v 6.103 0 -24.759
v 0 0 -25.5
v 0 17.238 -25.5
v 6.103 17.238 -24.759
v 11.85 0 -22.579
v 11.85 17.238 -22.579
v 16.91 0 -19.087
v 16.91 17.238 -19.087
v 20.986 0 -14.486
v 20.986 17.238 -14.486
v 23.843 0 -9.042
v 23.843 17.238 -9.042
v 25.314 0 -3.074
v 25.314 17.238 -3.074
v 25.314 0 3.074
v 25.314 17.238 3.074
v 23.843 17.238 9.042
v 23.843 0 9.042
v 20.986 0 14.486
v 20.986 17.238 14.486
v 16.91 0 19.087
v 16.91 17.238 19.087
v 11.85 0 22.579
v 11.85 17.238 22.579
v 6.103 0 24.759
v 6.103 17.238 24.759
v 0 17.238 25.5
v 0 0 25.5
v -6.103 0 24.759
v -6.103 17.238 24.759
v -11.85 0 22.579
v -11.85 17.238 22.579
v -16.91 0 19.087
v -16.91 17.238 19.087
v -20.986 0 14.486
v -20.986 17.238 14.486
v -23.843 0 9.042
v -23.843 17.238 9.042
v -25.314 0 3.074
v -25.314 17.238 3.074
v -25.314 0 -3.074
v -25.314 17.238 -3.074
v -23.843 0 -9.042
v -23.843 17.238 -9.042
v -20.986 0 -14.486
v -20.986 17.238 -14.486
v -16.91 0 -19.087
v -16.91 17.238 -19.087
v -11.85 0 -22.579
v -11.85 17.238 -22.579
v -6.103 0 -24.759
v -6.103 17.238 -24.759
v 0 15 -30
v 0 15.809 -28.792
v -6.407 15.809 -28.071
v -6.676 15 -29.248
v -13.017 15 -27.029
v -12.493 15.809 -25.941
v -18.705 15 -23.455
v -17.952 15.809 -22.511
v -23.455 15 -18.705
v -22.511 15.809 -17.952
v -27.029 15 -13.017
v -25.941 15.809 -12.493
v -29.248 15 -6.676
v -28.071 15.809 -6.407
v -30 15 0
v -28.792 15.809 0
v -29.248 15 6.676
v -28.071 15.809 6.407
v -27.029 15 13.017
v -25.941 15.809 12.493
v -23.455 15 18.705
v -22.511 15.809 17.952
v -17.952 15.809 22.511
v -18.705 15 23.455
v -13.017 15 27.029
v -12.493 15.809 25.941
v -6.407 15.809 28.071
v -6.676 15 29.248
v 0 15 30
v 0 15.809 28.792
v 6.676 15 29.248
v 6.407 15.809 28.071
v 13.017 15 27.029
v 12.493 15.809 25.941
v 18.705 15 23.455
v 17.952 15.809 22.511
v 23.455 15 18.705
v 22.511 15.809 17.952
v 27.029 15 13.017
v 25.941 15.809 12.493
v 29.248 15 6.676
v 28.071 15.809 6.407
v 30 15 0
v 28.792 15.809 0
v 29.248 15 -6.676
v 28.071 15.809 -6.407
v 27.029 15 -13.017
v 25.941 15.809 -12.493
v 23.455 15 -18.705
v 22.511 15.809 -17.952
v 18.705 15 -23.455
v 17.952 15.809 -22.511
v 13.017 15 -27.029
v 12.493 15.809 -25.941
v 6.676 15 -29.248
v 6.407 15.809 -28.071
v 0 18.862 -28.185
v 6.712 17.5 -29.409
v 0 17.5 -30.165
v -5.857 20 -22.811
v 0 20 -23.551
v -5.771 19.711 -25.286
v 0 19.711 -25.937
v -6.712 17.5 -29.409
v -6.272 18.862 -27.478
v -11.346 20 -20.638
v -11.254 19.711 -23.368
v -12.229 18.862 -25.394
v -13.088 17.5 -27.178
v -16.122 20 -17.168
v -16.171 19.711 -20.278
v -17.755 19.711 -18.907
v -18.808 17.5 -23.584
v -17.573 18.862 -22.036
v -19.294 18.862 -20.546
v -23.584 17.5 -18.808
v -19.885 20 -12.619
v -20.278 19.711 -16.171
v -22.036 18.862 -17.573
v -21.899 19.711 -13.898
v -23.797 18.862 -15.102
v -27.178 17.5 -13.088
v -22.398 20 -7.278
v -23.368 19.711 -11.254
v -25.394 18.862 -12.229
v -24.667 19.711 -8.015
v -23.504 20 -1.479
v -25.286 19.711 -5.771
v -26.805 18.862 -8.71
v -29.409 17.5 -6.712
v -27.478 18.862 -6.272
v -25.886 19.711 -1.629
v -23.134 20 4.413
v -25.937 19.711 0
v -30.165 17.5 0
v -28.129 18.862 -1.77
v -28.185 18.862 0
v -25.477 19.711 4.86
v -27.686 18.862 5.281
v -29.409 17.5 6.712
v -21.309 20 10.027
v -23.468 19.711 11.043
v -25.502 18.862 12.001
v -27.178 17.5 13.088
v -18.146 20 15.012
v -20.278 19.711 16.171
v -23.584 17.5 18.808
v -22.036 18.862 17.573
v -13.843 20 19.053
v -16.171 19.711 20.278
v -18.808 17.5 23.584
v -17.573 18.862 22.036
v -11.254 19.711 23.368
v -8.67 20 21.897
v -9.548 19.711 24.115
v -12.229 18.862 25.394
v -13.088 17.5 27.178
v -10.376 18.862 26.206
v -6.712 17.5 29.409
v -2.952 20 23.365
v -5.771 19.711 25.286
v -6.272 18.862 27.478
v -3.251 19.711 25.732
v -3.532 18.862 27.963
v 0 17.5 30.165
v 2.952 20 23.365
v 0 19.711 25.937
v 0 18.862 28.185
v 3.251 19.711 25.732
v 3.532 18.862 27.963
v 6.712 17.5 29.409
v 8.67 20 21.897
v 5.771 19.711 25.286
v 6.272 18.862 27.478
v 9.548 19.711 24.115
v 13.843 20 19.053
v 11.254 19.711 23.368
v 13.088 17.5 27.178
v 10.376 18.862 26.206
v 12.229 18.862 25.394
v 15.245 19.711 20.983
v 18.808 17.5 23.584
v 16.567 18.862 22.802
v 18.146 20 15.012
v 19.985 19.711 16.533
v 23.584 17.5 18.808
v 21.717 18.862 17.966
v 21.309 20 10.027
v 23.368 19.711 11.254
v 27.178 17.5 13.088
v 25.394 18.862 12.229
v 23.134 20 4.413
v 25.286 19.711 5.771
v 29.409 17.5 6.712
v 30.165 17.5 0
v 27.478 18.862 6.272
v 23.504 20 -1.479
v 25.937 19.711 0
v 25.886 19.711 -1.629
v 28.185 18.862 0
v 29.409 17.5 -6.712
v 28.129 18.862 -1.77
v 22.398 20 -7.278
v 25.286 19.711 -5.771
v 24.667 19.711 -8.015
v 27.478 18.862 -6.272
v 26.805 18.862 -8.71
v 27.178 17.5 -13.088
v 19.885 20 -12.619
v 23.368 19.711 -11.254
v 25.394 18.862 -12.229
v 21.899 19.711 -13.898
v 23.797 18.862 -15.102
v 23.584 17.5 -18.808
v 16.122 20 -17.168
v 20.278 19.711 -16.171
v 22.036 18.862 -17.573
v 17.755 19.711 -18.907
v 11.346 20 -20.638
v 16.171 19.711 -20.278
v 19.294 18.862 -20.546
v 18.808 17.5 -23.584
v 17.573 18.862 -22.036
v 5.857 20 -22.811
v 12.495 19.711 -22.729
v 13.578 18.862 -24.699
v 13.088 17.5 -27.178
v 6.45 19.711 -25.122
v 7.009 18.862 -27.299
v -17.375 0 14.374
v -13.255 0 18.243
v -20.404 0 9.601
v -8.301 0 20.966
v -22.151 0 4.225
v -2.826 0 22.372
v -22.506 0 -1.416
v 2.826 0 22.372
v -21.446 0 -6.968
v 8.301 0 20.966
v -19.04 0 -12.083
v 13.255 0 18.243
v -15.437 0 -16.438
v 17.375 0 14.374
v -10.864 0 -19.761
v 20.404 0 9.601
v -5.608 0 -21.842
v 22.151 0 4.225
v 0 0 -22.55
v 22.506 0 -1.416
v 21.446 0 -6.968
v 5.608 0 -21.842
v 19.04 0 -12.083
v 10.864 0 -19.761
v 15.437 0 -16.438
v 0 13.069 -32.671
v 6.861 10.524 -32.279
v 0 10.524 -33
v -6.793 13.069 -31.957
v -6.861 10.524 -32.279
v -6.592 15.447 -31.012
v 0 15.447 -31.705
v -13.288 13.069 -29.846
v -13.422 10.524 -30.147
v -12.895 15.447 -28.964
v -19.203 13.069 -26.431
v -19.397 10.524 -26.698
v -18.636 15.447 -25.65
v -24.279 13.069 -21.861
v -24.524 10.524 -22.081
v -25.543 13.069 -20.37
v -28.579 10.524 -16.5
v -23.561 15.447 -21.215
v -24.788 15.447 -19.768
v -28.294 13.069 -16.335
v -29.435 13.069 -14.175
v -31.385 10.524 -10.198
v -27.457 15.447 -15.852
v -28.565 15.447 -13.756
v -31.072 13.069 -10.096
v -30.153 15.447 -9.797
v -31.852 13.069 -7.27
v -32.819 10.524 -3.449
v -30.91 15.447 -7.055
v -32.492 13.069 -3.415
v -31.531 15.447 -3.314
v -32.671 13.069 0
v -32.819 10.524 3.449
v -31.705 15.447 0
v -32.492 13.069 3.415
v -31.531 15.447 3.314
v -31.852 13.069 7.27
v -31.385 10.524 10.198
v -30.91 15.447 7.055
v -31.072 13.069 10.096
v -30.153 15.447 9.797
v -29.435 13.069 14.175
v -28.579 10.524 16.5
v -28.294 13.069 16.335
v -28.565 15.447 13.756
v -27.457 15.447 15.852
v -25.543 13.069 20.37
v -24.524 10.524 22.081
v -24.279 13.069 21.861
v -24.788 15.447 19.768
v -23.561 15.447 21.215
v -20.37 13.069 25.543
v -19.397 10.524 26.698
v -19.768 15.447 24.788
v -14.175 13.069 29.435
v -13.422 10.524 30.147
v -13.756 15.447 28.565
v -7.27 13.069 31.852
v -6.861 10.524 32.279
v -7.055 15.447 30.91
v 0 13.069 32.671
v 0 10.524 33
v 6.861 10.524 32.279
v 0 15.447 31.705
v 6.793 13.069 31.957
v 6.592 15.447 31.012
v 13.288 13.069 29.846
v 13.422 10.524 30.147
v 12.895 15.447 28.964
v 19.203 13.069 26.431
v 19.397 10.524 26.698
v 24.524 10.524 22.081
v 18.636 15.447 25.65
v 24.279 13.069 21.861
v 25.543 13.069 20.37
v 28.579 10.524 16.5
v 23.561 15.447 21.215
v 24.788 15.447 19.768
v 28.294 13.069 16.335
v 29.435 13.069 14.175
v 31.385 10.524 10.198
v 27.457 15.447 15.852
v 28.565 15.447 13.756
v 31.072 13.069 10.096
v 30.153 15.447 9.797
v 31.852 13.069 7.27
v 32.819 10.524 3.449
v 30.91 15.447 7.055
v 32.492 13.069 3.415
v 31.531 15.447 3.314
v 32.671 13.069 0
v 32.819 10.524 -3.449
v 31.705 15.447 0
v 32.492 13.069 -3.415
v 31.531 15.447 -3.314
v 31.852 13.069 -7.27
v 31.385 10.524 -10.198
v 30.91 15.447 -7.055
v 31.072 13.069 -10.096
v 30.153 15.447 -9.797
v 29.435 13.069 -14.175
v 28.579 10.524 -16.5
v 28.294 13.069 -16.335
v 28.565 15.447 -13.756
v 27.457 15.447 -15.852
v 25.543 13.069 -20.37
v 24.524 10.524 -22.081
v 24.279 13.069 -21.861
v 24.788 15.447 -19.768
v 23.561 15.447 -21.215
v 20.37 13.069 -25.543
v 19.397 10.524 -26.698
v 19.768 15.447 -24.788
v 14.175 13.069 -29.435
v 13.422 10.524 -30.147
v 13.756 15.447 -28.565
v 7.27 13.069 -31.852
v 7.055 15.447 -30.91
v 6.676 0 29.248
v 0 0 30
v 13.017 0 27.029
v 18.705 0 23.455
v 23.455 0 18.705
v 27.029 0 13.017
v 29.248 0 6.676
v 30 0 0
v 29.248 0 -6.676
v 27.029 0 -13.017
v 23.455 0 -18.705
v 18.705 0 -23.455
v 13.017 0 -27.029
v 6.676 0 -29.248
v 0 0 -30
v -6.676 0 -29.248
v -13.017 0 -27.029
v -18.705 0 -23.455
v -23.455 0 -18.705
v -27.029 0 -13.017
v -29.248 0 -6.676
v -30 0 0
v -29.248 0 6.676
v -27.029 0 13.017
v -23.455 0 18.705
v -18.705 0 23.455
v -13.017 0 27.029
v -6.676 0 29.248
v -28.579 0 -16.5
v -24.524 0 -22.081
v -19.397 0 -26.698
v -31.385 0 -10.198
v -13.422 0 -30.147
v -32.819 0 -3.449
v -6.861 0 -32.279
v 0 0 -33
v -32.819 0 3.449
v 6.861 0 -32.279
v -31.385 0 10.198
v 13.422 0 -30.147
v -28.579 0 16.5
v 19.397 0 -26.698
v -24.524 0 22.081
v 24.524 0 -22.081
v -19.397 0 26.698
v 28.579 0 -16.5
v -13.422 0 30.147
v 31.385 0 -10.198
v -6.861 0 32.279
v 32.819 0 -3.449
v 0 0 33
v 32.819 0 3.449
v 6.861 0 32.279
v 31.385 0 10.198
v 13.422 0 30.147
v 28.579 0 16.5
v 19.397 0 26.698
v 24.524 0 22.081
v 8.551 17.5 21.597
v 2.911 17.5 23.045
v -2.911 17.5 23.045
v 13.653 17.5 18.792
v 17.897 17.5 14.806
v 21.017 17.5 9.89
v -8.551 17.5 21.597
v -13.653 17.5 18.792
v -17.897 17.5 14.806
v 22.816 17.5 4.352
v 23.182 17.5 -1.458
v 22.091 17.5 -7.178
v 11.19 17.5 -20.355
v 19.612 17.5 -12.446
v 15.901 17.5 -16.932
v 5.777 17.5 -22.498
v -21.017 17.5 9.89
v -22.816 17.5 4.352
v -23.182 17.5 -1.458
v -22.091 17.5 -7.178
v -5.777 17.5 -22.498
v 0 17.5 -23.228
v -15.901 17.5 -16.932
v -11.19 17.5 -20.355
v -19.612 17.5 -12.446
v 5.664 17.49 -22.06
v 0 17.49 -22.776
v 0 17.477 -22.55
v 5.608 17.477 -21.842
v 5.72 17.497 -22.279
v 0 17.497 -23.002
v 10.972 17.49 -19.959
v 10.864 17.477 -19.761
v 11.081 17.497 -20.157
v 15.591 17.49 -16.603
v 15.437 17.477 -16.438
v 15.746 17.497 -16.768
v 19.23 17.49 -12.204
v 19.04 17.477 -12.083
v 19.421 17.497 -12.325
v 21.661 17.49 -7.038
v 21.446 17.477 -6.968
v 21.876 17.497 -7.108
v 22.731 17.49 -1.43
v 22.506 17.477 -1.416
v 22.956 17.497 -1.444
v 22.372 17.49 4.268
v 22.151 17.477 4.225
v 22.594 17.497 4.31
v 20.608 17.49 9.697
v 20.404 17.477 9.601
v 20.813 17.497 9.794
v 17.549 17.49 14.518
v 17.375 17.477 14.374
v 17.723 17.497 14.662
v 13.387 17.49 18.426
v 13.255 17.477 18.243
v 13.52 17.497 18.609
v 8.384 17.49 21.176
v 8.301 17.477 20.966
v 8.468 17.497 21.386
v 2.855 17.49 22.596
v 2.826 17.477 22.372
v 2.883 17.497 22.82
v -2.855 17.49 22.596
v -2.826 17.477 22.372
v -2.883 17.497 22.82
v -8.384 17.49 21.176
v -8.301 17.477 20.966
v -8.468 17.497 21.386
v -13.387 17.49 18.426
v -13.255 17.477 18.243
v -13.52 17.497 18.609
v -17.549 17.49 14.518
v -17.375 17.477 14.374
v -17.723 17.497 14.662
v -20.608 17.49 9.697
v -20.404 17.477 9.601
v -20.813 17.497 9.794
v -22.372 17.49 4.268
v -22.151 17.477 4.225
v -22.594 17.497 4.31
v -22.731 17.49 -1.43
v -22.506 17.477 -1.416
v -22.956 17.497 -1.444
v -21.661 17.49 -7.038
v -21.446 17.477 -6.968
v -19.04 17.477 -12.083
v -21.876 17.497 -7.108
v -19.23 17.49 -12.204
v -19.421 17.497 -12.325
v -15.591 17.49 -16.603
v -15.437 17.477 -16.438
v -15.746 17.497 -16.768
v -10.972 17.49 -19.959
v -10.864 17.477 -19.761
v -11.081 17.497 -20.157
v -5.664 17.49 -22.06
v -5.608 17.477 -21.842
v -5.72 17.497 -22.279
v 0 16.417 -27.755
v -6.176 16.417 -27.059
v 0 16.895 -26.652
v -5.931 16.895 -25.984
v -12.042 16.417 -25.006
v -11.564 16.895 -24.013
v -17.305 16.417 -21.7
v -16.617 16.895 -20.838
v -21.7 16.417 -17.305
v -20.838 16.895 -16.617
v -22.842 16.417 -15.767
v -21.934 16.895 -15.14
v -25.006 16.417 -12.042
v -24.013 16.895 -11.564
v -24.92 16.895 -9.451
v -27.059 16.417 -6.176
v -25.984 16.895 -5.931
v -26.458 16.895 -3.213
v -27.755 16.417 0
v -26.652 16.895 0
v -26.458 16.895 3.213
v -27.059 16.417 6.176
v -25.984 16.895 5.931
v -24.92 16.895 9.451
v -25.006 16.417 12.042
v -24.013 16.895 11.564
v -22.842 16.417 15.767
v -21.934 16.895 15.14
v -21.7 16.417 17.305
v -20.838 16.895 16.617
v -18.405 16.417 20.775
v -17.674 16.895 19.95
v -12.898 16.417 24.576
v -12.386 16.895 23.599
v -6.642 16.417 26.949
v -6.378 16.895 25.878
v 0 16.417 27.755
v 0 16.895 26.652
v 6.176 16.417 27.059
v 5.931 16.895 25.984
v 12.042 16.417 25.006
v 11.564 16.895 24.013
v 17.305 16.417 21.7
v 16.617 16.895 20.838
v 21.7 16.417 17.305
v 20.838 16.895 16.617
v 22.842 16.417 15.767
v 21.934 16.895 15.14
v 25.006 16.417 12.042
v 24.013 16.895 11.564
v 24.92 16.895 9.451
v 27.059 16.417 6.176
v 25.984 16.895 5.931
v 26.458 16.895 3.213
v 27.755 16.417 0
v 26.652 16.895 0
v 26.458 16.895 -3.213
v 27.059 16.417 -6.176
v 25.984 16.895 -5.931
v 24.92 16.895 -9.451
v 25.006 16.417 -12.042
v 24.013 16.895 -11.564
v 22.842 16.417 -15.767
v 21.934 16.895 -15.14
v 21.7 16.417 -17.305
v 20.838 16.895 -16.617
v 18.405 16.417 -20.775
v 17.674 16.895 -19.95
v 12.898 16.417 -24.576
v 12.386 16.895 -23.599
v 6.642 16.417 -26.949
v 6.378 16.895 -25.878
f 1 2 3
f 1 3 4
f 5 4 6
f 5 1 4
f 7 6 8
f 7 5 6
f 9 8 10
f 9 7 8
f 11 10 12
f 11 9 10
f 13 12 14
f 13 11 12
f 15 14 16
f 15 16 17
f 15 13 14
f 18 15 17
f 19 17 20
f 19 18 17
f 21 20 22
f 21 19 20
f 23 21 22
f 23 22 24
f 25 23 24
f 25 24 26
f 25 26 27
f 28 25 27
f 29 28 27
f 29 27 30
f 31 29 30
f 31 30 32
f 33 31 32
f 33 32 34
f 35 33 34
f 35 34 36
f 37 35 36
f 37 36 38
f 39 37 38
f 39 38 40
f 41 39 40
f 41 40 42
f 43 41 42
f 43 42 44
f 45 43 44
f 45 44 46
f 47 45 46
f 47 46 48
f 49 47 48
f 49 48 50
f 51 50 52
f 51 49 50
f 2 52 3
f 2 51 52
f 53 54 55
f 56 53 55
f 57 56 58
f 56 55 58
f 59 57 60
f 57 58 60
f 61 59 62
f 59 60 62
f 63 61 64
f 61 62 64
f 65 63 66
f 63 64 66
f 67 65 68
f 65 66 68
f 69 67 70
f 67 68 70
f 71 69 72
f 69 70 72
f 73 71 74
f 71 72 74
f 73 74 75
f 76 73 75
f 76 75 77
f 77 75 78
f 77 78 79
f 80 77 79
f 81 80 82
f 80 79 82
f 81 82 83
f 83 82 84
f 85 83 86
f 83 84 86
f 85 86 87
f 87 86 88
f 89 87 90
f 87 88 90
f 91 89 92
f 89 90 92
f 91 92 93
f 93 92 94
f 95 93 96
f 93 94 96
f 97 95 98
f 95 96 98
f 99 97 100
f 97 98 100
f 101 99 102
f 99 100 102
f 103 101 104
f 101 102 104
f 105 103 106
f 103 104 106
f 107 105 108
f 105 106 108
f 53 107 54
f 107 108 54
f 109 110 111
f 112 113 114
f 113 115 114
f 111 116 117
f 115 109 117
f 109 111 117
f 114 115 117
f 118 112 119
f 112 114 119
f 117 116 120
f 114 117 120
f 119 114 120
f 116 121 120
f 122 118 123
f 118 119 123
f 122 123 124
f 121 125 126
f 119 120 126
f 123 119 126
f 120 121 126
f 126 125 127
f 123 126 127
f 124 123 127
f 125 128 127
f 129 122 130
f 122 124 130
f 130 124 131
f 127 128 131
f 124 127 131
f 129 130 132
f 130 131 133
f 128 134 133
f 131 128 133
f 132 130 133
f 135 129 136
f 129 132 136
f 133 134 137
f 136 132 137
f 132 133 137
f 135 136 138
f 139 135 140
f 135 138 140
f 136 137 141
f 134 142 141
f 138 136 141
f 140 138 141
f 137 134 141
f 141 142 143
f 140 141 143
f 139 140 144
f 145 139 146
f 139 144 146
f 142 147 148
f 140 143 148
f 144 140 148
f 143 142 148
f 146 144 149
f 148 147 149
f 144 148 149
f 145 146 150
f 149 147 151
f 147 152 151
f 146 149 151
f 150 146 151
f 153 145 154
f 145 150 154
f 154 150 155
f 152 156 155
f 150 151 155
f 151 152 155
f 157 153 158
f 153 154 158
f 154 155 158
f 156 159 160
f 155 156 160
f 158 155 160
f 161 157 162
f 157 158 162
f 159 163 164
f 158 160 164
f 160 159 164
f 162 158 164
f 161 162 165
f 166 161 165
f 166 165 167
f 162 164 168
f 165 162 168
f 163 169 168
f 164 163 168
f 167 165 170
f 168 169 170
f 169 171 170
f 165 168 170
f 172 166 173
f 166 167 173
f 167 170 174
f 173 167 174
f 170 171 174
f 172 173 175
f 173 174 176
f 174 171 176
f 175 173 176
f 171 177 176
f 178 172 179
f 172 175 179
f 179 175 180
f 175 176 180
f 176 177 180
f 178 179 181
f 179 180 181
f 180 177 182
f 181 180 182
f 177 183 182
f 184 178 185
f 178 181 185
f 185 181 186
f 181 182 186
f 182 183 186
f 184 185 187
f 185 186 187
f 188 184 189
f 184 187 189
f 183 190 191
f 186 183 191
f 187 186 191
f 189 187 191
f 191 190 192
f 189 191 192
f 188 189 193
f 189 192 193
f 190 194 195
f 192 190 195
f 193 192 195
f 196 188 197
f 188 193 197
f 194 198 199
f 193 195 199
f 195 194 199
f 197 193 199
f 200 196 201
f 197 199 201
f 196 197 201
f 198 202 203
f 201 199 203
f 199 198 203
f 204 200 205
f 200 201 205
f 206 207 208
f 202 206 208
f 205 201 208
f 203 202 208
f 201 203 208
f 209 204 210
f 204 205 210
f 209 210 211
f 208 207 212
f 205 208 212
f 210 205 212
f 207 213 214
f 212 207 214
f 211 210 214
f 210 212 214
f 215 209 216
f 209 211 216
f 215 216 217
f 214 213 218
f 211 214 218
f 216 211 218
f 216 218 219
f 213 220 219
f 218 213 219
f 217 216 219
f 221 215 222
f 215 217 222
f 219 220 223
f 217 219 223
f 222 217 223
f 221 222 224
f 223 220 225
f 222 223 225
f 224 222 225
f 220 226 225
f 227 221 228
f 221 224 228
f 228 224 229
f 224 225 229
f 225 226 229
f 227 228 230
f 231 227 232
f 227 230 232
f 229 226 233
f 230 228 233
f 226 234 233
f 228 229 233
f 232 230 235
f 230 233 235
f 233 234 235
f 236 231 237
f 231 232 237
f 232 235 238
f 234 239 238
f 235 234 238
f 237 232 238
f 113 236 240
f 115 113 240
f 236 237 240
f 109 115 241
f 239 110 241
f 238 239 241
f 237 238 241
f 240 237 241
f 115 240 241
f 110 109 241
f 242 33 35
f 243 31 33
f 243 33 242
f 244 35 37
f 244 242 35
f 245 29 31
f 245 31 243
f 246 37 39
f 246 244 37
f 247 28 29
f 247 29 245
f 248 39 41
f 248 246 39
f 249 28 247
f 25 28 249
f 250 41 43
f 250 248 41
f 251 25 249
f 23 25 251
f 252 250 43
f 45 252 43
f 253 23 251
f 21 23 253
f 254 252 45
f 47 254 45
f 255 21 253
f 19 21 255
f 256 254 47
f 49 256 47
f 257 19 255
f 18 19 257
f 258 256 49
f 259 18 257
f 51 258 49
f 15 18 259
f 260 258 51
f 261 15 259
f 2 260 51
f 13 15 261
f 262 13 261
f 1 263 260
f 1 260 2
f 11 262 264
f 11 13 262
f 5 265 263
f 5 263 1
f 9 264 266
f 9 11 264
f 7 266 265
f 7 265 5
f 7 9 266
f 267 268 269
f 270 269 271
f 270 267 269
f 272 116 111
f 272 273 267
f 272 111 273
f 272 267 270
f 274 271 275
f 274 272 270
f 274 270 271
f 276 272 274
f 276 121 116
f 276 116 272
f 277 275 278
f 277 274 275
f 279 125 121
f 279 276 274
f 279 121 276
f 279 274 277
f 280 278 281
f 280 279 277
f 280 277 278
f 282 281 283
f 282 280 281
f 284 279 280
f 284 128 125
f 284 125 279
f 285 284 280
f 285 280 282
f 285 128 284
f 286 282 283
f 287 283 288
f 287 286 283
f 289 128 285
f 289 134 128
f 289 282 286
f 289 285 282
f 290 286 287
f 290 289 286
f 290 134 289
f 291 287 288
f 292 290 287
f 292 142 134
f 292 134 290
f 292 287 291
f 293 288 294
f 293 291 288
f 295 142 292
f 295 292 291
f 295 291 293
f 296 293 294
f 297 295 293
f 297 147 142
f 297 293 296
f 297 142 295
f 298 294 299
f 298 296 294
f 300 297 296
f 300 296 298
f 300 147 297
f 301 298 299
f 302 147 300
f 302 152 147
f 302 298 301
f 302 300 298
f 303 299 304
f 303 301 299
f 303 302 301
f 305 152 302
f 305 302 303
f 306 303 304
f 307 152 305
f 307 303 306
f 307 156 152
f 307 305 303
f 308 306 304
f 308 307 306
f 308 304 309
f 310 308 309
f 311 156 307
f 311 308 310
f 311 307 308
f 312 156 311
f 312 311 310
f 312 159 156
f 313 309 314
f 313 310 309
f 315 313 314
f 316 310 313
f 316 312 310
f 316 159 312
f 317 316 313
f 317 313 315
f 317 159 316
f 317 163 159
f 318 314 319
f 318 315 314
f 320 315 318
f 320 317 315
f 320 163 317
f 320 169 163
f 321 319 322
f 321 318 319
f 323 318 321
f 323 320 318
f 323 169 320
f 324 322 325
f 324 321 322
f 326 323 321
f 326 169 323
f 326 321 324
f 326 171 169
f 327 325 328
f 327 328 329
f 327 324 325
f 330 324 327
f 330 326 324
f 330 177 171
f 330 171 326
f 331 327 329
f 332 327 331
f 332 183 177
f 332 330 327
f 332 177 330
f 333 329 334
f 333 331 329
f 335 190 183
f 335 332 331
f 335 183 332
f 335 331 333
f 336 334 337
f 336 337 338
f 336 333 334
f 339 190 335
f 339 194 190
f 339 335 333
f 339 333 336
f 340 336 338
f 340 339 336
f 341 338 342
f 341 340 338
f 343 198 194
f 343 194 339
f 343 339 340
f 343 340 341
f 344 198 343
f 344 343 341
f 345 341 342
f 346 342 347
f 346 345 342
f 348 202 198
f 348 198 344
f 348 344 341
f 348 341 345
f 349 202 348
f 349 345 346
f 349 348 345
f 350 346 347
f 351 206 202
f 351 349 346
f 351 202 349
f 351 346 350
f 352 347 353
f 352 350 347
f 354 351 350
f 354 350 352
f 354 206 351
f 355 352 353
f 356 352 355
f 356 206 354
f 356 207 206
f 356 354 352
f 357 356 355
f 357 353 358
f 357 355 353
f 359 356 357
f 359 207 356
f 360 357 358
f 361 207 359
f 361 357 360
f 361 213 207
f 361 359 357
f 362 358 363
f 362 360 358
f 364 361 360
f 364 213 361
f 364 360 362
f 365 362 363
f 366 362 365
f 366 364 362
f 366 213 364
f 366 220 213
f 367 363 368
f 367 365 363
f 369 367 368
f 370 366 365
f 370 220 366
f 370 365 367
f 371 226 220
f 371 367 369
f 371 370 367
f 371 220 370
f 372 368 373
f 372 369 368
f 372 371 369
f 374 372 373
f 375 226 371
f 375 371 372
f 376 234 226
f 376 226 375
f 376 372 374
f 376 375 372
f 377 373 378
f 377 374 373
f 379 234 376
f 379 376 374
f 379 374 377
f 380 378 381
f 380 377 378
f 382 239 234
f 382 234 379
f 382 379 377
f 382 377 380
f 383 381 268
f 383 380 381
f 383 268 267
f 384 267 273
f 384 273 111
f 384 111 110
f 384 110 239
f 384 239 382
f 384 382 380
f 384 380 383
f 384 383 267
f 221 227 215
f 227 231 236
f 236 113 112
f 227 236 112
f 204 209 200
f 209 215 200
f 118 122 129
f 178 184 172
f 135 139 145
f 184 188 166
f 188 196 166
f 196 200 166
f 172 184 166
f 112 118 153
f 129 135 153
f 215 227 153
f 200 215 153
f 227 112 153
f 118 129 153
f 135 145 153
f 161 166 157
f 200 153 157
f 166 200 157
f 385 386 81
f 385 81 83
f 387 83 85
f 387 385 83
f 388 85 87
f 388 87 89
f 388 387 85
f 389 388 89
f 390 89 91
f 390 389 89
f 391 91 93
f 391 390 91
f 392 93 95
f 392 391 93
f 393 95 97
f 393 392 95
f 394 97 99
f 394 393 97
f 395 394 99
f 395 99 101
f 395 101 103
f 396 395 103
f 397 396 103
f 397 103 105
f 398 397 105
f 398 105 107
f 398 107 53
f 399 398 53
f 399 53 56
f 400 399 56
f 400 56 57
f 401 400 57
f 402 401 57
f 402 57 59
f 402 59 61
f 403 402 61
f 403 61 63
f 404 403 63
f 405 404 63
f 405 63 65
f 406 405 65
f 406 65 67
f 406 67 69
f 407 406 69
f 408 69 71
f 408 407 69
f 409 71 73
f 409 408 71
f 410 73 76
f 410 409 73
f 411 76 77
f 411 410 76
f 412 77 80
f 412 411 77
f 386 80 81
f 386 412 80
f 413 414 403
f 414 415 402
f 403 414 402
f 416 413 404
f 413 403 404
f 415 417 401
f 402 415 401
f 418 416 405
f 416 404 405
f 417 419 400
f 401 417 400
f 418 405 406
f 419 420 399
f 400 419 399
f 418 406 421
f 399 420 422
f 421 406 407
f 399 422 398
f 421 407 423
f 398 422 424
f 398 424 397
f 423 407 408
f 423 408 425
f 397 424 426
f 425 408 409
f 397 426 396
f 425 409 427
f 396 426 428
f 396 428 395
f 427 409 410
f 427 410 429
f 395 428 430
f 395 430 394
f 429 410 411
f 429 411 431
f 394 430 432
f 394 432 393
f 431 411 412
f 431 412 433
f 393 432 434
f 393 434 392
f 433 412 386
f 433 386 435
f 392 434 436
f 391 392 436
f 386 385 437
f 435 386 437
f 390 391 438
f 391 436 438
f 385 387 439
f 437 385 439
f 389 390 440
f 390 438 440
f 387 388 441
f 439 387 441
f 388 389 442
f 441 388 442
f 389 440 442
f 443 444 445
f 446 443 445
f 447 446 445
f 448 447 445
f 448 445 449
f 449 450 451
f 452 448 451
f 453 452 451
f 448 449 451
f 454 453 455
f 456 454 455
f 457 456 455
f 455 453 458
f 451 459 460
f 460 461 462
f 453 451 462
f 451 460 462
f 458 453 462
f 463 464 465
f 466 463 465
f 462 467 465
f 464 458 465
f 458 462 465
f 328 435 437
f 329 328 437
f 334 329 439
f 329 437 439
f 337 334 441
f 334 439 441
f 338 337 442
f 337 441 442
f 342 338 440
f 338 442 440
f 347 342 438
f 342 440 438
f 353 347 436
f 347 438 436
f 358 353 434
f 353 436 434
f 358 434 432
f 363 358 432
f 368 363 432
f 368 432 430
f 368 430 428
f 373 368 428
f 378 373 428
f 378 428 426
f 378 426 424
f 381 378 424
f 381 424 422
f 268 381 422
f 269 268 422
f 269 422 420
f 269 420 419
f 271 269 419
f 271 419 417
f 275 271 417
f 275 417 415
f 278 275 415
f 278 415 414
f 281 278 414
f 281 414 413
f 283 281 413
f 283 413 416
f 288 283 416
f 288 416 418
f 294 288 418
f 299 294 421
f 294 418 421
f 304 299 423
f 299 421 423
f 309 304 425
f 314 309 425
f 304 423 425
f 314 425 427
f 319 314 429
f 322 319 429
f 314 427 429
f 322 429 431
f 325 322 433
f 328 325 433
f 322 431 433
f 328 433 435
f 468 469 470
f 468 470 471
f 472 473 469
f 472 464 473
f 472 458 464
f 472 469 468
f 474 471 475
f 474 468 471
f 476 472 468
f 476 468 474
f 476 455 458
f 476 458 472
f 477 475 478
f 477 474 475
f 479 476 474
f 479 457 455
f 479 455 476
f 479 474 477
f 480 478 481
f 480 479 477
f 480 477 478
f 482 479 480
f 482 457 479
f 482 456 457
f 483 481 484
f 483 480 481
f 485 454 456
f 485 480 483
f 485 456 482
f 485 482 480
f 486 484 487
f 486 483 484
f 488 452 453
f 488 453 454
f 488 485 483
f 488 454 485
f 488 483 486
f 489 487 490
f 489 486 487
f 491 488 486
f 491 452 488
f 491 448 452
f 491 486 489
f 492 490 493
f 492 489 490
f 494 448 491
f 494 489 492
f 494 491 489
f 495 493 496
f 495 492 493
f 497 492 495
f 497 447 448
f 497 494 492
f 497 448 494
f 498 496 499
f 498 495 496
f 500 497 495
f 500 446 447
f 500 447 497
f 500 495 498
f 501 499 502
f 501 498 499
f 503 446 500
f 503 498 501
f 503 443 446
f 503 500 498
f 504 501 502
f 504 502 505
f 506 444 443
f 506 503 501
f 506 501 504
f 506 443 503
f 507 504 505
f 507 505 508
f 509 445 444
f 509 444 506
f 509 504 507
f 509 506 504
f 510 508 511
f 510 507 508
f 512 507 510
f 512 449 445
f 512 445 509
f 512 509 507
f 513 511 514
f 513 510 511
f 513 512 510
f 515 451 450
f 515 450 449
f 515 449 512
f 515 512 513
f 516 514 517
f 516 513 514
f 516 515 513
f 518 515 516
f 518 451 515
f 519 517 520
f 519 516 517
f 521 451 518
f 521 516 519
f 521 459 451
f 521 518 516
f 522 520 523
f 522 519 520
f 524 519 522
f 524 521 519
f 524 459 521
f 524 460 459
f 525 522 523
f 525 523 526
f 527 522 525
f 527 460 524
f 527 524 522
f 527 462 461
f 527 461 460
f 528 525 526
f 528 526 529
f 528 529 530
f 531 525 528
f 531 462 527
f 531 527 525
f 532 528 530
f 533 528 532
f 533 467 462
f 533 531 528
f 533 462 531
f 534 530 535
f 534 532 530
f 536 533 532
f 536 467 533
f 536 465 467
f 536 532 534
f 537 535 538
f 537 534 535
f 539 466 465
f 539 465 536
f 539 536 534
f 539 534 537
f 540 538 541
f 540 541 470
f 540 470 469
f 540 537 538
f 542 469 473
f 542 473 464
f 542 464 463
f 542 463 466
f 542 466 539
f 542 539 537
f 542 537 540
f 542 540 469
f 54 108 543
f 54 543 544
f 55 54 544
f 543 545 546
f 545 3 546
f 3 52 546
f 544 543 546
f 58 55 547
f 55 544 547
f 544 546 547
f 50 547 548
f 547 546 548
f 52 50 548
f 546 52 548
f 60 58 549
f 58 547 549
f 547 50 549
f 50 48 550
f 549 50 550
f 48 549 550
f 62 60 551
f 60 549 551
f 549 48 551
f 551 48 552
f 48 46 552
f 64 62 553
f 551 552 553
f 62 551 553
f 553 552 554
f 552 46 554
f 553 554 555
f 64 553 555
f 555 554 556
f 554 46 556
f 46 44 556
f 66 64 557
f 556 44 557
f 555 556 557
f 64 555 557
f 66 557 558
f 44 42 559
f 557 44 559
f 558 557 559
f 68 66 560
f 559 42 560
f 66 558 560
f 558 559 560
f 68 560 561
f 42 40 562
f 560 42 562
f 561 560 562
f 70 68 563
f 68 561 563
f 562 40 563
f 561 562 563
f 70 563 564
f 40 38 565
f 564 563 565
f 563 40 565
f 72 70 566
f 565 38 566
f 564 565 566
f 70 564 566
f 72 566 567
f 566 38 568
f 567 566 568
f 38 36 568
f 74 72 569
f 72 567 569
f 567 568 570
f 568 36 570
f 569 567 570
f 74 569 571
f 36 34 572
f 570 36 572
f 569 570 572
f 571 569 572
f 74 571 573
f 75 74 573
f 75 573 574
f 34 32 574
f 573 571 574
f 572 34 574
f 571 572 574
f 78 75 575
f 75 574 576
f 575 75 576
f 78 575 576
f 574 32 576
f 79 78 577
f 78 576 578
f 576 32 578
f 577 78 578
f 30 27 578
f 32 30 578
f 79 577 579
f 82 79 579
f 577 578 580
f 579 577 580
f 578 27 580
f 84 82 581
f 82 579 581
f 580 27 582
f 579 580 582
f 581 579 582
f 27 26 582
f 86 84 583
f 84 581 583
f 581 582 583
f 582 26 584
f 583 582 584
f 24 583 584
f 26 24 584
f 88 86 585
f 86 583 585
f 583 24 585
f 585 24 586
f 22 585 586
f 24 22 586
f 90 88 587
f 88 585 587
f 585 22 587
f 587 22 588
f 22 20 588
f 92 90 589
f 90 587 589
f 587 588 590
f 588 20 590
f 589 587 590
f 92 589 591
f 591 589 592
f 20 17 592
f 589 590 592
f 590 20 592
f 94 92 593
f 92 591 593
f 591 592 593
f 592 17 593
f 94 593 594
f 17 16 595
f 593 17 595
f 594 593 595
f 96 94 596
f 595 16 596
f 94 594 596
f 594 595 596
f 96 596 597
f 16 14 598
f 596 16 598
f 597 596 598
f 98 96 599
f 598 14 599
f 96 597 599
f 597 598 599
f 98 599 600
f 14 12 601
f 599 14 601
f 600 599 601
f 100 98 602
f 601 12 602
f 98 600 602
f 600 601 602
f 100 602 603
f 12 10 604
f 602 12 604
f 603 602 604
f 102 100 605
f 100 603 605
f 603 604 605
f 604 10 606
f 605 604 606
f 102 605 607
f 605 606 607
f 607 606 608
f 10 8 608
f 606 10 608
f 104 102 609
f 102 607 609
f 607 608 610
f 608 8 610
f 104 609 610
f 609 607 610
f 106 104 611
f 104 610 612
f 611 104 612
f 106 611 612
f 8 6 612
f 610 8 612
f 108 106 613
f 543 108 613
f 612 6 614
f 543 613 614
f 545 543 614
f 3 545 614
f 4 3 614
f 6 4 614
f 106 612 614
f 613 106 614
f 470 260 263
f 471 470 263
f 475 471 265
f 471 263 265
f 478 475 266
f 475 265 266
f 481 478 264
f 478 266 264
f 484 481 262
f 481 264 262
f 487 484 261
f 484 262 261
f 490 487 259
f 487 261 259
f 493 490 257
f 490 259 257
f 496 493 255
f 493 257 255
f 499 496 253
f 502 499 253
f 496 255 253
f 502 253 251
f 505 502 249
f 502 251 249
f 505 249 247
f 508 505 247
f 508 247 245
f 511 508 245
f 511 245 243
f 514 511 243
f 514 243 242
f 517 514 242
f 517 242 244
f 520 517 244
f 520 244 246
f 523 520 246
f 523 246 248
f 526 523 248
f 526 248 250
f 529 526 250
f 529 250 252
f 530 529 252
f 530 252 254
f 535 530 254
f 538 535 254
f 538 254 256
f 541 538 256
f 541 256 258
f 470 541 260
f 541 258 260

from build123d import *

# Parameters (mm, degrees)
SKETCH1_R                      = 33
SKETCH1_R_2                    = 30
BOSS_EXTRUDE2_DEPTH            = 15
BOSS_EXTRUDE3_REACH            = 52.774
BOSS_EXTRUDE3_END_MAJOR_RADIUS = 23.22782186
BOSS_EXTRUDE3_END_MINOR_RADIUS = 10
SKETCH4_R                      = 25.5
SKETCH4_R_2                    = 22.55
FILLET1_R                      = 10


with BuildPart() as part:
    # Sketch1 → Boss-Extrude2 (new body)
    with BuildSketch(Plane(origin=(0, 0, 0), x_dir=(1, 0, 0), z_dir=(0, 1, 0))):
        with Locations(Location((0, 0, 0), (0, 0, 270))):
            Circle(SKETCH1_R)
        with Locations(Location((0, 0, 0), (0, 0, 270))):
            Circle(SKETCH1_R_2, mode=Mode.SUBTRACT)
    extrude(amount=BOSS_EXTRUDE2_DEPTH)

    # Sketch3 → Revolve1 (revolve)
    with BuildSketch(Plane.XY, mode=Mode.PRIVATE) as revolve1_sk:
        with BuildLine():
            Line((0, 20), (-23.550888175, 20))
            ThreePointArc((-23.550888175, 20), (-27.086422081, 19.354143467), (-30.165266452, 17.5))
            Line((-30.165266452, 17.5), (-33, 15))
            Line((-33, 15), (-30, 15))
            Line((-30, 15), (-28.792397579, 15.80876026))
            ThreePointArc((-28.792397579, 15.80876026), (-26.135776243, 17.067852492), (-23.22782186, 17.5))
            Line((-23.22782186, 17.5), (0, 17.5))
            Line((0, 17.5), (0, 20))
        make_face()
    revolve(revolve1_sk.sketch.rotate(Axis((0, 15, 0), (0, 1, 0)), 270), axis=Axis((0, 15, 0), (0, 1, 0)))

    # Boss-Extrude3: up to this torus (the profile starts inside it)
    boss_extrude3_end = Plane(origin=(0, 7.5, 0), z_dir=(0, -1, 0)) * Torus(BOSS_EXTRUDE3_END_MAJOR_RADIUS, BOSS_EXTRUDE3_END_MINOR_RADIUS, mode=Mode.PRIVATE)
    # Sketch4 → Boss-Extrude3 (add, up to the surface)
    with BuildSketch(Plane.XZ, mode=Mode.PRIVATE) as boss_extrude3_sk1:
        with Locations(Location((0, 0, 0), (0, 0, 270))):
            Circle(SKETCH4_R)
        with Locations(Location((0, 0, 0), (0, 0, 270))):
            Circle(SKETCH4_R_2, mode=Mode.SUBTRACT)
    boss_extrude3_tool1 = extrude(boss_extrude3_sk1.sketch, amount=-BOSS_EXTRUDE3_REACH, mode=Mode.PRIVATE) & boss_extrude3_end
    add(boss_extrude3_tool1.solids().sort_by_distance((0, 0, 24.778751))[0])

    # Fillet1
    # the kernel refuses this fillet: 10 mm, written as the material it takes off along each edge
    with BuildSketch(Plane(origin=(0, 15, 0), x_dir=(0, 0, -1), z_dir=(1, 0, 0))) as fillet1_piece_1:
        with BuildLine():
            CenterArc((23, -4.475597226), FILLET1_R, 0, 44.231546617)
            Line((30.165266452, 2.5), (30.308571781, 2.639511945))
            ThreePointArc((30.308571781, 2.639511945), (31.714920792, 1.4), (33.132287566, 0.15))
            Line((33.132287566, 0.15), (33.2, 0))
            Line((33.2, 0), (33.2, -4.475597226))
            Line((33.2, -4.475597226), (33, -4.475597226))
        make_face()
    revolve(axis=Axis((0, 15, 0), (0, 1, 0)), revolution_arc=180, mode=Mode.SUBTRACT)
    with BuildSketch(Plane(origin=(0, 15, 0), x_dir=(0, 0, 1), z_dir=(-1, 0, 0))) as fillet1_piece_2:
        with BuildLine():
            CenterArc((23, -4.475597226), FILLET1_R, 0, 44.231546617)
            Line((30.165266452, 2.5), (30.308571781, 2.639511945))
            ThreePointArc((30.308571781, 2.639511945), (31.714920792, 1.4), (33.132287566, 0.15))
            Line((33.132287566, 0.15), (33.2, 0))
            Line((33.2, 0), (33.2, -4.475597226))
            Line((33.2, -4.475597226), (33, -4.475597226))
        make_face()
    revolve(axis=Axis((0, 15, 0), (0, 1, 0)), revolution_arc=180, mode=Mode.SUBTRACT)


solid = part.part
